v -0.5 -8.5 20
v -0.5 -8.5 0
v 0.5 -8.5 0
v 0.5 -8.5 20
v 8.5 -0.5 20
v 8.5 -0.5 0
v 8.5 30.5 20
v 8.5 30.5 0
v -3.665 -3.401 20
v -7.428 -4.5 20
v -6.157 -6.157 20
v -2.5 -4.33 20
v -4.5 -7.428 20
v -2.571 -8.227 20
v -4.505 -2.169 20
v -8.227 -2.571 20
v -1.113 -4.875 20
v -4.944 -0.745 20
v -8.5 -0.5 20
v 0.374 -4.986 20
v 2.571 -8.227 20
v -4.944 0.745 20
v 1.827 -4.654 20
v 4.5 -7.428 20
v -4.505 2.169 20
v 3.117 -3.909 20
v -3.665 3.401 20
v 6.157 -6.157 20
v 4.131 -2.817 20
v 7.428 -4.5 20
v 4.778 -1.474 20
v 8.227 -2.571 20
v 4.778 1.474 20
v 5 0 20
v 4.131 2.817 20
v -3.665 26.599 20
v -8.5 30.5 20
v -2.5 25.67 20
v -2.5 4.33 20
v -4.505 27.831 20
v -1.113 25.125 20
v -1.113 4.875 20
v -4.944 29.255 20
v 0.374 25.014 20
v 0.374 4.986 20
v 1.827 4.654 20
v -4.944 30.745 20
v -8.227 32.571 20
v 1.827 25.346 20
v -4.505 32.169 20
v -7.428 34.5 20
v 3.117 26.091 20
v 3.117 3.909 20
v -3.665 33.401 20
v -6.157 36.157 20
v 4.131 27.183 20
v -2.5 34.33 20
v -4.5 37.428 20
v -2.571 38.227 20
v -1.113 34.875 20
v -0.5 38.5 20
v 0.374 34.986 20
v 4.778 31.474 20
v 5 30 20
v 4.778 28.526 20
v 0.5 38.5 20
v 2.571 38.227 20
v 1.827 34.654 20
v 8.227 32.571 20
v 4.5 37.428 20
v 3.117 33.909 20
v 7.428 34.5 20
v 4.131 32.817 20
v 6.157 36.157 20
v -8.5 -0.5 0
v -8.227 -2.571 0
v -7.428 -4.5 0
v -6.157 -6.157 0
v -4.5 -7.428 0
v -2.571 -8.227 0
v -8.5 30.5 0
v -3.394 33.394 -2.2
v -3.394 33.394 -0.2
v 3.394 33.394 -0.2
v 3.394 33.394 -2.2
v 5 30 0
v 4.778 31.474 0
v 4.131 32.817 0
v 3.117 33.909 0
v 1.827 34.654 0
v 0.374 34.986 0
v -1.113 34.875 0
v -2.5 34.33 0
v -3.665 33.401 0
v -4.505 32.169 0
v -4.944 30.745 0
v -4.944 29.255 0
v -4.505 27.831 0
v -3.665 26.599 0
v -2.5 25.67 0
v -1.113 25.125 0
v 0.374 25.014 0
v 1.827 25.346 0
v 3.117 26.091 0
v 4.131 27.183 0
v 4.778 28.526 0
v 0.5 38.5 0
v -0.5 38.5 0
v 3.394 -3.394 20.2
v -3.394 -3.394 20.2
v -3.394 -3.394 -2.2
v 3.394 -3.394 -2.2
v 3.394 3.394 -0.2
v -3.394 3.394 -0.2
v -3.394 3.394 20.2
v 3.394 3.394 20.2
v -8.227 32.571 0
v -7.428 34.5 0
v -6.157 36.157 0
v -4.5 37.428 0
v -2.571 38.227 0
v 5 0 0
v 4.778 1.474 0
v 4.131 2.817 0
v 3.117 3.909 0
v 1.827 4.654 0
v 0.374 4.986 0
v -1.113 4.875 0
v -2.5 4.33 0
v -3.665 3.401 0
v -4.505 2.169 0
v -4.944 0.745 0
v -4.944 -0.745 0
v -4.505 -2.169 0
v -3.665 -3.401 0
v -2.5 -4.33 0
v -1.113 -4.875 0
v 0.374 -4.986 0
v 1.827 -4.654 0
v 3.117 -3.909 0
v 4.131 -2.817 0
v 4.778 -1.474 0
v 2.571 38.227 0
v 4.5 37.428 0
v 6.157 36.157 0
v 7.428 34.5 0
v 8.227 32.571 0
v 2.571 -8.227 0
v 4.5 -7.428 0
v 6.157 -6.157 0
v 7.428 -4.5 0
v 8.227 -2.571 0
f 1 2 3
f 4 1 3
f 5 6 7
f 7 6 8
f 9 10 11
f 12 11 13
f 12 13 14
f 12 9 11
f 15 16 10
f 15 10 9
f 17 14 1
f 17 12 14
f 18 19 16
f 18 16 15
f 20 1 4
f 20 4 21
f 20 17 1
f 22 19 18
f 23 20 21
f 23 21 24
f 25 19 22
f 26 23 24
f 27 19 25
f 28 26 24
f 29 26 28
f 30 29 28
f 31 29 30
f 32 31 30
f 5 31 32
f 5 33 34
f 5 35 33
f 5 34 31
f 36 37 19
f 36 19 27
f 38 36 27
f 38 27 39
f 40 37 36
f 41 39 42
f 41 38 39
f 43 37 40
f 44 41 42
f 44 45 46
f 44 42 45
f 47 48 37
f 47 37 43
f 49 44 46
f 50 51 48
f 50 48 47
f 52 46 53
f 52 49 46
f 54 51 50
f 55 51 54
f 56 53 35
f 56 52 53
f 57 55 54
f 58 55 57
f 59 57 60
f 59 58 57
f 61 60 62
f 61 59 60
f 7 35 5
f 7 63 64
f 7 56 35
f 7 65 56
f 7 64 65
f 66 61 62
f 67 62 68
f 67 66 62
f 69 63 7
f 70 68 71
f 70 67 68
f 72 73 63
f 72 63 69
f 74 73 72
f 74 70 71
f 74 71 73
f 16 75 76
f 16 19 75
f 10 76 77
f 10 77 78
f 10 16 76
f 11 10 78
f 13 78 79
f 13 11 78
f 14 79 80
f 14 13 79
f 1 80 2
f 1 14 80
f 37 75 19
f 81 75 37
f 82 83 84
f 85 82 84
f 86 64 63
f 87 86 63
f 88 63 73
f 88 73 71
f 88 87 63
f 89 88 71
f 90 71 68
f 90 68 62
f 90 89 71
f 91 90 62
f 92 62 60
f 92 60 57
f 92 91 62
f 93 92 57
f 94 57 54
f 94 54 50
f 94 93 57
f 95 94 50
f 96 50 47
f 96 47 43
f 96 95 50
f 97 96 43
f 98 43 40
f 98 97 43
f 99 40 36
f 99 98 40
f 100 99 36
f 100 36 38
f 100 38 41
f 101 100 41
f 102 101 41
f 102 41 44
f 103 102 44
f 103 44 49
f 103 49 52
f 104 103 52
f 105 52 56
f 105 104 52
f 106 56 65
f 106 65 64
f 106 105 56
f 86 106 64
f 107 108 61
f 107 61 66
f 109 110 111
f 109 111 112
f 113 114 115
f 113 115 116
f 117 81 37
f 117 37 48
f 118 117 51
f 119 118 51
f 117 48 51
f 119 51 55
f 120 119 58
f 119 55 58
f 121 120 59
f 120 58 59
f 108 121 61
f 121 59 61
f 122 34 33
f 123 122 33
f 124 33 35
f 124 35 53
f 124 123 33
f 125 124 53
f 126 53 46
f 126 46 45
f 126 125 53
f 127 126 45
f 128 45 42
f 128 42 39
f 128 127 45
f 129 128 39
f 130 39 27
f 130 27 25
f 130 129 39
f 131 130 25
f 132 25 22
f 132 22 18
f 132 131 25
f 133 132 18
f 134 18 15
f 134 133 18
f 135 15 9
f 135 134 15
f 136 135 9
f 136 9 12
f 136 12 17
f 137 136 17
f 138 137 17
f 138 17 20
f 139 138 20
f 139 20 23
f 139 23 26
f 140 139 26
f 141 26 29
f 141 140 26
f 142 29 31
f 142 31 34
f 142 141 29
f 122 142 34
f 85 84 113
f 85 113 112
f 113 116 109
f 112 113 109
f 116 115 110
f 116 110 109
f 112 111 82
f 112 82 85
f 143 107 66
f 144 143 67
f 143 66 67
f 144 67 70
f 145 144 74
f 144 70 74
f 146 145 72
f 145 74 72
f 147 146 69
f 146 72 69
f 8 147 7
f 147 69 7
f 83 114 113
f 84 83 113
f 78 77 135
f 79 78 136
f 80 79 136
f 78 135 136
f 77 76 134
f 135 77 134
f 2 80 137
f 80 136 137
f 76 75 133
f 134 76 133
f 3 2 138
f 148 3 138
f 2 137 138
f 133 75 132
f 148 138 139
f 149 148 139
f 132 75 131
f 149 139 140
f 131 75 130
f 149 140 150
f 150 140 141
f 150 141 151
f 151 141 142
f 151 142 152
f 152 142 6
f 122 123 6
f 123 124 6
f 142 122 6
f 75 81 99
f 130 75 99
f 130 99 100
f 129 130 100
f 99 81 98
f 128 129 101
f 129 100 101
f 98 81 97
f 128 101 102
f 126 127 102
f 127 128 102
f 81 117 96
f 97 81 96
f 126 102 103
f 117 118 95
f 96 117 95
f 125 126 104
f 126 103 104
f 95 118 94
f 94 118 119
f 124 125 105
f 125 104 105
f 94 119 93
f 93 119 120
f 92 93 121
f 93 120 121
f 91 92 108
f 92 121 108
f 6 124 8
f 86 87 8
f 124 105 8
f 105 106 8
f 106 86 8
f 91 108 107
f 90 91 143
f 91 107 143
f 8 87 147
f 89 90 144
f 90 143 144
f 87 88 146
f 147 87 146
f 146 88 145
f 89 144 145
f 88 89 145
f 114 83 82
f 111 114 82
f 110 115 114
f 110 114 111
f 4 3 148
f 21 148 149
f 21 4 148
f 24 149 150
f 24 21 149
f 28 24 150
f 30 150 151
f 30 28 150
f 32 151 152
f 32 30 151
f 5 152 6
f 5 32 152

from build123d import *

# Parameters (mm, degrees)
F0_W     = 17
F0_H     = 47
F0_R     = 5
F1_DEPTH = 20
F2_R     = 8
F4_W     = 6.788226
F4_H     = 6.788226
F5_DEPTH = 20.4
F6_W     = 6.788226
F6_H     = 36.788226
F7_DEPTH = 2


with BuildPart() as f1:
    # F0 (on Top) → F1 (new body)
    with BuildSketch(Plane.XY):
        with Locations((0, 15)):
            Rectangle(F0_W, F0_H)
        Circle(F0_R, mode=Mode.SUBTRACT)
        with Locations((0, 30)):
            Circle(F0_R, mode=Mode.SUBTRACT)
    extrude(amount=F1_DEPTH)

    # F2
    f2_edges = [f1.edges().sort_by_distance(p)[0] for p in [
        (8.5, -8.5, 10),
        (-8.5, -8.5, 10),
        (8.5, 38.5, 10),
        (-8.5, 38.5, 10),
    ]]
    fillet(f2_edges, radius=F2_R)


with BuildPart() as f5:
    # F4 (on offset) → F5 (new body)
    with BuildSketch(Plane.XY.offset(-0.2)):
        Rectangle(F4_W, F4_H)
    extrude(amount=F5_DEPTH)

    # F6 (on face) → F7 (join)
    with BuildSketch(Plane(origin=(0, 0, -0.2), x_dir=(1, 0, 0), z_dir=(0, 0, -1))):
        with Locations((0, -15)):
            Rectangle(F6_W, F6_H)
    extrude(amount=F7_DEPTH)


solid = Compound([f1.part, f5.part])
